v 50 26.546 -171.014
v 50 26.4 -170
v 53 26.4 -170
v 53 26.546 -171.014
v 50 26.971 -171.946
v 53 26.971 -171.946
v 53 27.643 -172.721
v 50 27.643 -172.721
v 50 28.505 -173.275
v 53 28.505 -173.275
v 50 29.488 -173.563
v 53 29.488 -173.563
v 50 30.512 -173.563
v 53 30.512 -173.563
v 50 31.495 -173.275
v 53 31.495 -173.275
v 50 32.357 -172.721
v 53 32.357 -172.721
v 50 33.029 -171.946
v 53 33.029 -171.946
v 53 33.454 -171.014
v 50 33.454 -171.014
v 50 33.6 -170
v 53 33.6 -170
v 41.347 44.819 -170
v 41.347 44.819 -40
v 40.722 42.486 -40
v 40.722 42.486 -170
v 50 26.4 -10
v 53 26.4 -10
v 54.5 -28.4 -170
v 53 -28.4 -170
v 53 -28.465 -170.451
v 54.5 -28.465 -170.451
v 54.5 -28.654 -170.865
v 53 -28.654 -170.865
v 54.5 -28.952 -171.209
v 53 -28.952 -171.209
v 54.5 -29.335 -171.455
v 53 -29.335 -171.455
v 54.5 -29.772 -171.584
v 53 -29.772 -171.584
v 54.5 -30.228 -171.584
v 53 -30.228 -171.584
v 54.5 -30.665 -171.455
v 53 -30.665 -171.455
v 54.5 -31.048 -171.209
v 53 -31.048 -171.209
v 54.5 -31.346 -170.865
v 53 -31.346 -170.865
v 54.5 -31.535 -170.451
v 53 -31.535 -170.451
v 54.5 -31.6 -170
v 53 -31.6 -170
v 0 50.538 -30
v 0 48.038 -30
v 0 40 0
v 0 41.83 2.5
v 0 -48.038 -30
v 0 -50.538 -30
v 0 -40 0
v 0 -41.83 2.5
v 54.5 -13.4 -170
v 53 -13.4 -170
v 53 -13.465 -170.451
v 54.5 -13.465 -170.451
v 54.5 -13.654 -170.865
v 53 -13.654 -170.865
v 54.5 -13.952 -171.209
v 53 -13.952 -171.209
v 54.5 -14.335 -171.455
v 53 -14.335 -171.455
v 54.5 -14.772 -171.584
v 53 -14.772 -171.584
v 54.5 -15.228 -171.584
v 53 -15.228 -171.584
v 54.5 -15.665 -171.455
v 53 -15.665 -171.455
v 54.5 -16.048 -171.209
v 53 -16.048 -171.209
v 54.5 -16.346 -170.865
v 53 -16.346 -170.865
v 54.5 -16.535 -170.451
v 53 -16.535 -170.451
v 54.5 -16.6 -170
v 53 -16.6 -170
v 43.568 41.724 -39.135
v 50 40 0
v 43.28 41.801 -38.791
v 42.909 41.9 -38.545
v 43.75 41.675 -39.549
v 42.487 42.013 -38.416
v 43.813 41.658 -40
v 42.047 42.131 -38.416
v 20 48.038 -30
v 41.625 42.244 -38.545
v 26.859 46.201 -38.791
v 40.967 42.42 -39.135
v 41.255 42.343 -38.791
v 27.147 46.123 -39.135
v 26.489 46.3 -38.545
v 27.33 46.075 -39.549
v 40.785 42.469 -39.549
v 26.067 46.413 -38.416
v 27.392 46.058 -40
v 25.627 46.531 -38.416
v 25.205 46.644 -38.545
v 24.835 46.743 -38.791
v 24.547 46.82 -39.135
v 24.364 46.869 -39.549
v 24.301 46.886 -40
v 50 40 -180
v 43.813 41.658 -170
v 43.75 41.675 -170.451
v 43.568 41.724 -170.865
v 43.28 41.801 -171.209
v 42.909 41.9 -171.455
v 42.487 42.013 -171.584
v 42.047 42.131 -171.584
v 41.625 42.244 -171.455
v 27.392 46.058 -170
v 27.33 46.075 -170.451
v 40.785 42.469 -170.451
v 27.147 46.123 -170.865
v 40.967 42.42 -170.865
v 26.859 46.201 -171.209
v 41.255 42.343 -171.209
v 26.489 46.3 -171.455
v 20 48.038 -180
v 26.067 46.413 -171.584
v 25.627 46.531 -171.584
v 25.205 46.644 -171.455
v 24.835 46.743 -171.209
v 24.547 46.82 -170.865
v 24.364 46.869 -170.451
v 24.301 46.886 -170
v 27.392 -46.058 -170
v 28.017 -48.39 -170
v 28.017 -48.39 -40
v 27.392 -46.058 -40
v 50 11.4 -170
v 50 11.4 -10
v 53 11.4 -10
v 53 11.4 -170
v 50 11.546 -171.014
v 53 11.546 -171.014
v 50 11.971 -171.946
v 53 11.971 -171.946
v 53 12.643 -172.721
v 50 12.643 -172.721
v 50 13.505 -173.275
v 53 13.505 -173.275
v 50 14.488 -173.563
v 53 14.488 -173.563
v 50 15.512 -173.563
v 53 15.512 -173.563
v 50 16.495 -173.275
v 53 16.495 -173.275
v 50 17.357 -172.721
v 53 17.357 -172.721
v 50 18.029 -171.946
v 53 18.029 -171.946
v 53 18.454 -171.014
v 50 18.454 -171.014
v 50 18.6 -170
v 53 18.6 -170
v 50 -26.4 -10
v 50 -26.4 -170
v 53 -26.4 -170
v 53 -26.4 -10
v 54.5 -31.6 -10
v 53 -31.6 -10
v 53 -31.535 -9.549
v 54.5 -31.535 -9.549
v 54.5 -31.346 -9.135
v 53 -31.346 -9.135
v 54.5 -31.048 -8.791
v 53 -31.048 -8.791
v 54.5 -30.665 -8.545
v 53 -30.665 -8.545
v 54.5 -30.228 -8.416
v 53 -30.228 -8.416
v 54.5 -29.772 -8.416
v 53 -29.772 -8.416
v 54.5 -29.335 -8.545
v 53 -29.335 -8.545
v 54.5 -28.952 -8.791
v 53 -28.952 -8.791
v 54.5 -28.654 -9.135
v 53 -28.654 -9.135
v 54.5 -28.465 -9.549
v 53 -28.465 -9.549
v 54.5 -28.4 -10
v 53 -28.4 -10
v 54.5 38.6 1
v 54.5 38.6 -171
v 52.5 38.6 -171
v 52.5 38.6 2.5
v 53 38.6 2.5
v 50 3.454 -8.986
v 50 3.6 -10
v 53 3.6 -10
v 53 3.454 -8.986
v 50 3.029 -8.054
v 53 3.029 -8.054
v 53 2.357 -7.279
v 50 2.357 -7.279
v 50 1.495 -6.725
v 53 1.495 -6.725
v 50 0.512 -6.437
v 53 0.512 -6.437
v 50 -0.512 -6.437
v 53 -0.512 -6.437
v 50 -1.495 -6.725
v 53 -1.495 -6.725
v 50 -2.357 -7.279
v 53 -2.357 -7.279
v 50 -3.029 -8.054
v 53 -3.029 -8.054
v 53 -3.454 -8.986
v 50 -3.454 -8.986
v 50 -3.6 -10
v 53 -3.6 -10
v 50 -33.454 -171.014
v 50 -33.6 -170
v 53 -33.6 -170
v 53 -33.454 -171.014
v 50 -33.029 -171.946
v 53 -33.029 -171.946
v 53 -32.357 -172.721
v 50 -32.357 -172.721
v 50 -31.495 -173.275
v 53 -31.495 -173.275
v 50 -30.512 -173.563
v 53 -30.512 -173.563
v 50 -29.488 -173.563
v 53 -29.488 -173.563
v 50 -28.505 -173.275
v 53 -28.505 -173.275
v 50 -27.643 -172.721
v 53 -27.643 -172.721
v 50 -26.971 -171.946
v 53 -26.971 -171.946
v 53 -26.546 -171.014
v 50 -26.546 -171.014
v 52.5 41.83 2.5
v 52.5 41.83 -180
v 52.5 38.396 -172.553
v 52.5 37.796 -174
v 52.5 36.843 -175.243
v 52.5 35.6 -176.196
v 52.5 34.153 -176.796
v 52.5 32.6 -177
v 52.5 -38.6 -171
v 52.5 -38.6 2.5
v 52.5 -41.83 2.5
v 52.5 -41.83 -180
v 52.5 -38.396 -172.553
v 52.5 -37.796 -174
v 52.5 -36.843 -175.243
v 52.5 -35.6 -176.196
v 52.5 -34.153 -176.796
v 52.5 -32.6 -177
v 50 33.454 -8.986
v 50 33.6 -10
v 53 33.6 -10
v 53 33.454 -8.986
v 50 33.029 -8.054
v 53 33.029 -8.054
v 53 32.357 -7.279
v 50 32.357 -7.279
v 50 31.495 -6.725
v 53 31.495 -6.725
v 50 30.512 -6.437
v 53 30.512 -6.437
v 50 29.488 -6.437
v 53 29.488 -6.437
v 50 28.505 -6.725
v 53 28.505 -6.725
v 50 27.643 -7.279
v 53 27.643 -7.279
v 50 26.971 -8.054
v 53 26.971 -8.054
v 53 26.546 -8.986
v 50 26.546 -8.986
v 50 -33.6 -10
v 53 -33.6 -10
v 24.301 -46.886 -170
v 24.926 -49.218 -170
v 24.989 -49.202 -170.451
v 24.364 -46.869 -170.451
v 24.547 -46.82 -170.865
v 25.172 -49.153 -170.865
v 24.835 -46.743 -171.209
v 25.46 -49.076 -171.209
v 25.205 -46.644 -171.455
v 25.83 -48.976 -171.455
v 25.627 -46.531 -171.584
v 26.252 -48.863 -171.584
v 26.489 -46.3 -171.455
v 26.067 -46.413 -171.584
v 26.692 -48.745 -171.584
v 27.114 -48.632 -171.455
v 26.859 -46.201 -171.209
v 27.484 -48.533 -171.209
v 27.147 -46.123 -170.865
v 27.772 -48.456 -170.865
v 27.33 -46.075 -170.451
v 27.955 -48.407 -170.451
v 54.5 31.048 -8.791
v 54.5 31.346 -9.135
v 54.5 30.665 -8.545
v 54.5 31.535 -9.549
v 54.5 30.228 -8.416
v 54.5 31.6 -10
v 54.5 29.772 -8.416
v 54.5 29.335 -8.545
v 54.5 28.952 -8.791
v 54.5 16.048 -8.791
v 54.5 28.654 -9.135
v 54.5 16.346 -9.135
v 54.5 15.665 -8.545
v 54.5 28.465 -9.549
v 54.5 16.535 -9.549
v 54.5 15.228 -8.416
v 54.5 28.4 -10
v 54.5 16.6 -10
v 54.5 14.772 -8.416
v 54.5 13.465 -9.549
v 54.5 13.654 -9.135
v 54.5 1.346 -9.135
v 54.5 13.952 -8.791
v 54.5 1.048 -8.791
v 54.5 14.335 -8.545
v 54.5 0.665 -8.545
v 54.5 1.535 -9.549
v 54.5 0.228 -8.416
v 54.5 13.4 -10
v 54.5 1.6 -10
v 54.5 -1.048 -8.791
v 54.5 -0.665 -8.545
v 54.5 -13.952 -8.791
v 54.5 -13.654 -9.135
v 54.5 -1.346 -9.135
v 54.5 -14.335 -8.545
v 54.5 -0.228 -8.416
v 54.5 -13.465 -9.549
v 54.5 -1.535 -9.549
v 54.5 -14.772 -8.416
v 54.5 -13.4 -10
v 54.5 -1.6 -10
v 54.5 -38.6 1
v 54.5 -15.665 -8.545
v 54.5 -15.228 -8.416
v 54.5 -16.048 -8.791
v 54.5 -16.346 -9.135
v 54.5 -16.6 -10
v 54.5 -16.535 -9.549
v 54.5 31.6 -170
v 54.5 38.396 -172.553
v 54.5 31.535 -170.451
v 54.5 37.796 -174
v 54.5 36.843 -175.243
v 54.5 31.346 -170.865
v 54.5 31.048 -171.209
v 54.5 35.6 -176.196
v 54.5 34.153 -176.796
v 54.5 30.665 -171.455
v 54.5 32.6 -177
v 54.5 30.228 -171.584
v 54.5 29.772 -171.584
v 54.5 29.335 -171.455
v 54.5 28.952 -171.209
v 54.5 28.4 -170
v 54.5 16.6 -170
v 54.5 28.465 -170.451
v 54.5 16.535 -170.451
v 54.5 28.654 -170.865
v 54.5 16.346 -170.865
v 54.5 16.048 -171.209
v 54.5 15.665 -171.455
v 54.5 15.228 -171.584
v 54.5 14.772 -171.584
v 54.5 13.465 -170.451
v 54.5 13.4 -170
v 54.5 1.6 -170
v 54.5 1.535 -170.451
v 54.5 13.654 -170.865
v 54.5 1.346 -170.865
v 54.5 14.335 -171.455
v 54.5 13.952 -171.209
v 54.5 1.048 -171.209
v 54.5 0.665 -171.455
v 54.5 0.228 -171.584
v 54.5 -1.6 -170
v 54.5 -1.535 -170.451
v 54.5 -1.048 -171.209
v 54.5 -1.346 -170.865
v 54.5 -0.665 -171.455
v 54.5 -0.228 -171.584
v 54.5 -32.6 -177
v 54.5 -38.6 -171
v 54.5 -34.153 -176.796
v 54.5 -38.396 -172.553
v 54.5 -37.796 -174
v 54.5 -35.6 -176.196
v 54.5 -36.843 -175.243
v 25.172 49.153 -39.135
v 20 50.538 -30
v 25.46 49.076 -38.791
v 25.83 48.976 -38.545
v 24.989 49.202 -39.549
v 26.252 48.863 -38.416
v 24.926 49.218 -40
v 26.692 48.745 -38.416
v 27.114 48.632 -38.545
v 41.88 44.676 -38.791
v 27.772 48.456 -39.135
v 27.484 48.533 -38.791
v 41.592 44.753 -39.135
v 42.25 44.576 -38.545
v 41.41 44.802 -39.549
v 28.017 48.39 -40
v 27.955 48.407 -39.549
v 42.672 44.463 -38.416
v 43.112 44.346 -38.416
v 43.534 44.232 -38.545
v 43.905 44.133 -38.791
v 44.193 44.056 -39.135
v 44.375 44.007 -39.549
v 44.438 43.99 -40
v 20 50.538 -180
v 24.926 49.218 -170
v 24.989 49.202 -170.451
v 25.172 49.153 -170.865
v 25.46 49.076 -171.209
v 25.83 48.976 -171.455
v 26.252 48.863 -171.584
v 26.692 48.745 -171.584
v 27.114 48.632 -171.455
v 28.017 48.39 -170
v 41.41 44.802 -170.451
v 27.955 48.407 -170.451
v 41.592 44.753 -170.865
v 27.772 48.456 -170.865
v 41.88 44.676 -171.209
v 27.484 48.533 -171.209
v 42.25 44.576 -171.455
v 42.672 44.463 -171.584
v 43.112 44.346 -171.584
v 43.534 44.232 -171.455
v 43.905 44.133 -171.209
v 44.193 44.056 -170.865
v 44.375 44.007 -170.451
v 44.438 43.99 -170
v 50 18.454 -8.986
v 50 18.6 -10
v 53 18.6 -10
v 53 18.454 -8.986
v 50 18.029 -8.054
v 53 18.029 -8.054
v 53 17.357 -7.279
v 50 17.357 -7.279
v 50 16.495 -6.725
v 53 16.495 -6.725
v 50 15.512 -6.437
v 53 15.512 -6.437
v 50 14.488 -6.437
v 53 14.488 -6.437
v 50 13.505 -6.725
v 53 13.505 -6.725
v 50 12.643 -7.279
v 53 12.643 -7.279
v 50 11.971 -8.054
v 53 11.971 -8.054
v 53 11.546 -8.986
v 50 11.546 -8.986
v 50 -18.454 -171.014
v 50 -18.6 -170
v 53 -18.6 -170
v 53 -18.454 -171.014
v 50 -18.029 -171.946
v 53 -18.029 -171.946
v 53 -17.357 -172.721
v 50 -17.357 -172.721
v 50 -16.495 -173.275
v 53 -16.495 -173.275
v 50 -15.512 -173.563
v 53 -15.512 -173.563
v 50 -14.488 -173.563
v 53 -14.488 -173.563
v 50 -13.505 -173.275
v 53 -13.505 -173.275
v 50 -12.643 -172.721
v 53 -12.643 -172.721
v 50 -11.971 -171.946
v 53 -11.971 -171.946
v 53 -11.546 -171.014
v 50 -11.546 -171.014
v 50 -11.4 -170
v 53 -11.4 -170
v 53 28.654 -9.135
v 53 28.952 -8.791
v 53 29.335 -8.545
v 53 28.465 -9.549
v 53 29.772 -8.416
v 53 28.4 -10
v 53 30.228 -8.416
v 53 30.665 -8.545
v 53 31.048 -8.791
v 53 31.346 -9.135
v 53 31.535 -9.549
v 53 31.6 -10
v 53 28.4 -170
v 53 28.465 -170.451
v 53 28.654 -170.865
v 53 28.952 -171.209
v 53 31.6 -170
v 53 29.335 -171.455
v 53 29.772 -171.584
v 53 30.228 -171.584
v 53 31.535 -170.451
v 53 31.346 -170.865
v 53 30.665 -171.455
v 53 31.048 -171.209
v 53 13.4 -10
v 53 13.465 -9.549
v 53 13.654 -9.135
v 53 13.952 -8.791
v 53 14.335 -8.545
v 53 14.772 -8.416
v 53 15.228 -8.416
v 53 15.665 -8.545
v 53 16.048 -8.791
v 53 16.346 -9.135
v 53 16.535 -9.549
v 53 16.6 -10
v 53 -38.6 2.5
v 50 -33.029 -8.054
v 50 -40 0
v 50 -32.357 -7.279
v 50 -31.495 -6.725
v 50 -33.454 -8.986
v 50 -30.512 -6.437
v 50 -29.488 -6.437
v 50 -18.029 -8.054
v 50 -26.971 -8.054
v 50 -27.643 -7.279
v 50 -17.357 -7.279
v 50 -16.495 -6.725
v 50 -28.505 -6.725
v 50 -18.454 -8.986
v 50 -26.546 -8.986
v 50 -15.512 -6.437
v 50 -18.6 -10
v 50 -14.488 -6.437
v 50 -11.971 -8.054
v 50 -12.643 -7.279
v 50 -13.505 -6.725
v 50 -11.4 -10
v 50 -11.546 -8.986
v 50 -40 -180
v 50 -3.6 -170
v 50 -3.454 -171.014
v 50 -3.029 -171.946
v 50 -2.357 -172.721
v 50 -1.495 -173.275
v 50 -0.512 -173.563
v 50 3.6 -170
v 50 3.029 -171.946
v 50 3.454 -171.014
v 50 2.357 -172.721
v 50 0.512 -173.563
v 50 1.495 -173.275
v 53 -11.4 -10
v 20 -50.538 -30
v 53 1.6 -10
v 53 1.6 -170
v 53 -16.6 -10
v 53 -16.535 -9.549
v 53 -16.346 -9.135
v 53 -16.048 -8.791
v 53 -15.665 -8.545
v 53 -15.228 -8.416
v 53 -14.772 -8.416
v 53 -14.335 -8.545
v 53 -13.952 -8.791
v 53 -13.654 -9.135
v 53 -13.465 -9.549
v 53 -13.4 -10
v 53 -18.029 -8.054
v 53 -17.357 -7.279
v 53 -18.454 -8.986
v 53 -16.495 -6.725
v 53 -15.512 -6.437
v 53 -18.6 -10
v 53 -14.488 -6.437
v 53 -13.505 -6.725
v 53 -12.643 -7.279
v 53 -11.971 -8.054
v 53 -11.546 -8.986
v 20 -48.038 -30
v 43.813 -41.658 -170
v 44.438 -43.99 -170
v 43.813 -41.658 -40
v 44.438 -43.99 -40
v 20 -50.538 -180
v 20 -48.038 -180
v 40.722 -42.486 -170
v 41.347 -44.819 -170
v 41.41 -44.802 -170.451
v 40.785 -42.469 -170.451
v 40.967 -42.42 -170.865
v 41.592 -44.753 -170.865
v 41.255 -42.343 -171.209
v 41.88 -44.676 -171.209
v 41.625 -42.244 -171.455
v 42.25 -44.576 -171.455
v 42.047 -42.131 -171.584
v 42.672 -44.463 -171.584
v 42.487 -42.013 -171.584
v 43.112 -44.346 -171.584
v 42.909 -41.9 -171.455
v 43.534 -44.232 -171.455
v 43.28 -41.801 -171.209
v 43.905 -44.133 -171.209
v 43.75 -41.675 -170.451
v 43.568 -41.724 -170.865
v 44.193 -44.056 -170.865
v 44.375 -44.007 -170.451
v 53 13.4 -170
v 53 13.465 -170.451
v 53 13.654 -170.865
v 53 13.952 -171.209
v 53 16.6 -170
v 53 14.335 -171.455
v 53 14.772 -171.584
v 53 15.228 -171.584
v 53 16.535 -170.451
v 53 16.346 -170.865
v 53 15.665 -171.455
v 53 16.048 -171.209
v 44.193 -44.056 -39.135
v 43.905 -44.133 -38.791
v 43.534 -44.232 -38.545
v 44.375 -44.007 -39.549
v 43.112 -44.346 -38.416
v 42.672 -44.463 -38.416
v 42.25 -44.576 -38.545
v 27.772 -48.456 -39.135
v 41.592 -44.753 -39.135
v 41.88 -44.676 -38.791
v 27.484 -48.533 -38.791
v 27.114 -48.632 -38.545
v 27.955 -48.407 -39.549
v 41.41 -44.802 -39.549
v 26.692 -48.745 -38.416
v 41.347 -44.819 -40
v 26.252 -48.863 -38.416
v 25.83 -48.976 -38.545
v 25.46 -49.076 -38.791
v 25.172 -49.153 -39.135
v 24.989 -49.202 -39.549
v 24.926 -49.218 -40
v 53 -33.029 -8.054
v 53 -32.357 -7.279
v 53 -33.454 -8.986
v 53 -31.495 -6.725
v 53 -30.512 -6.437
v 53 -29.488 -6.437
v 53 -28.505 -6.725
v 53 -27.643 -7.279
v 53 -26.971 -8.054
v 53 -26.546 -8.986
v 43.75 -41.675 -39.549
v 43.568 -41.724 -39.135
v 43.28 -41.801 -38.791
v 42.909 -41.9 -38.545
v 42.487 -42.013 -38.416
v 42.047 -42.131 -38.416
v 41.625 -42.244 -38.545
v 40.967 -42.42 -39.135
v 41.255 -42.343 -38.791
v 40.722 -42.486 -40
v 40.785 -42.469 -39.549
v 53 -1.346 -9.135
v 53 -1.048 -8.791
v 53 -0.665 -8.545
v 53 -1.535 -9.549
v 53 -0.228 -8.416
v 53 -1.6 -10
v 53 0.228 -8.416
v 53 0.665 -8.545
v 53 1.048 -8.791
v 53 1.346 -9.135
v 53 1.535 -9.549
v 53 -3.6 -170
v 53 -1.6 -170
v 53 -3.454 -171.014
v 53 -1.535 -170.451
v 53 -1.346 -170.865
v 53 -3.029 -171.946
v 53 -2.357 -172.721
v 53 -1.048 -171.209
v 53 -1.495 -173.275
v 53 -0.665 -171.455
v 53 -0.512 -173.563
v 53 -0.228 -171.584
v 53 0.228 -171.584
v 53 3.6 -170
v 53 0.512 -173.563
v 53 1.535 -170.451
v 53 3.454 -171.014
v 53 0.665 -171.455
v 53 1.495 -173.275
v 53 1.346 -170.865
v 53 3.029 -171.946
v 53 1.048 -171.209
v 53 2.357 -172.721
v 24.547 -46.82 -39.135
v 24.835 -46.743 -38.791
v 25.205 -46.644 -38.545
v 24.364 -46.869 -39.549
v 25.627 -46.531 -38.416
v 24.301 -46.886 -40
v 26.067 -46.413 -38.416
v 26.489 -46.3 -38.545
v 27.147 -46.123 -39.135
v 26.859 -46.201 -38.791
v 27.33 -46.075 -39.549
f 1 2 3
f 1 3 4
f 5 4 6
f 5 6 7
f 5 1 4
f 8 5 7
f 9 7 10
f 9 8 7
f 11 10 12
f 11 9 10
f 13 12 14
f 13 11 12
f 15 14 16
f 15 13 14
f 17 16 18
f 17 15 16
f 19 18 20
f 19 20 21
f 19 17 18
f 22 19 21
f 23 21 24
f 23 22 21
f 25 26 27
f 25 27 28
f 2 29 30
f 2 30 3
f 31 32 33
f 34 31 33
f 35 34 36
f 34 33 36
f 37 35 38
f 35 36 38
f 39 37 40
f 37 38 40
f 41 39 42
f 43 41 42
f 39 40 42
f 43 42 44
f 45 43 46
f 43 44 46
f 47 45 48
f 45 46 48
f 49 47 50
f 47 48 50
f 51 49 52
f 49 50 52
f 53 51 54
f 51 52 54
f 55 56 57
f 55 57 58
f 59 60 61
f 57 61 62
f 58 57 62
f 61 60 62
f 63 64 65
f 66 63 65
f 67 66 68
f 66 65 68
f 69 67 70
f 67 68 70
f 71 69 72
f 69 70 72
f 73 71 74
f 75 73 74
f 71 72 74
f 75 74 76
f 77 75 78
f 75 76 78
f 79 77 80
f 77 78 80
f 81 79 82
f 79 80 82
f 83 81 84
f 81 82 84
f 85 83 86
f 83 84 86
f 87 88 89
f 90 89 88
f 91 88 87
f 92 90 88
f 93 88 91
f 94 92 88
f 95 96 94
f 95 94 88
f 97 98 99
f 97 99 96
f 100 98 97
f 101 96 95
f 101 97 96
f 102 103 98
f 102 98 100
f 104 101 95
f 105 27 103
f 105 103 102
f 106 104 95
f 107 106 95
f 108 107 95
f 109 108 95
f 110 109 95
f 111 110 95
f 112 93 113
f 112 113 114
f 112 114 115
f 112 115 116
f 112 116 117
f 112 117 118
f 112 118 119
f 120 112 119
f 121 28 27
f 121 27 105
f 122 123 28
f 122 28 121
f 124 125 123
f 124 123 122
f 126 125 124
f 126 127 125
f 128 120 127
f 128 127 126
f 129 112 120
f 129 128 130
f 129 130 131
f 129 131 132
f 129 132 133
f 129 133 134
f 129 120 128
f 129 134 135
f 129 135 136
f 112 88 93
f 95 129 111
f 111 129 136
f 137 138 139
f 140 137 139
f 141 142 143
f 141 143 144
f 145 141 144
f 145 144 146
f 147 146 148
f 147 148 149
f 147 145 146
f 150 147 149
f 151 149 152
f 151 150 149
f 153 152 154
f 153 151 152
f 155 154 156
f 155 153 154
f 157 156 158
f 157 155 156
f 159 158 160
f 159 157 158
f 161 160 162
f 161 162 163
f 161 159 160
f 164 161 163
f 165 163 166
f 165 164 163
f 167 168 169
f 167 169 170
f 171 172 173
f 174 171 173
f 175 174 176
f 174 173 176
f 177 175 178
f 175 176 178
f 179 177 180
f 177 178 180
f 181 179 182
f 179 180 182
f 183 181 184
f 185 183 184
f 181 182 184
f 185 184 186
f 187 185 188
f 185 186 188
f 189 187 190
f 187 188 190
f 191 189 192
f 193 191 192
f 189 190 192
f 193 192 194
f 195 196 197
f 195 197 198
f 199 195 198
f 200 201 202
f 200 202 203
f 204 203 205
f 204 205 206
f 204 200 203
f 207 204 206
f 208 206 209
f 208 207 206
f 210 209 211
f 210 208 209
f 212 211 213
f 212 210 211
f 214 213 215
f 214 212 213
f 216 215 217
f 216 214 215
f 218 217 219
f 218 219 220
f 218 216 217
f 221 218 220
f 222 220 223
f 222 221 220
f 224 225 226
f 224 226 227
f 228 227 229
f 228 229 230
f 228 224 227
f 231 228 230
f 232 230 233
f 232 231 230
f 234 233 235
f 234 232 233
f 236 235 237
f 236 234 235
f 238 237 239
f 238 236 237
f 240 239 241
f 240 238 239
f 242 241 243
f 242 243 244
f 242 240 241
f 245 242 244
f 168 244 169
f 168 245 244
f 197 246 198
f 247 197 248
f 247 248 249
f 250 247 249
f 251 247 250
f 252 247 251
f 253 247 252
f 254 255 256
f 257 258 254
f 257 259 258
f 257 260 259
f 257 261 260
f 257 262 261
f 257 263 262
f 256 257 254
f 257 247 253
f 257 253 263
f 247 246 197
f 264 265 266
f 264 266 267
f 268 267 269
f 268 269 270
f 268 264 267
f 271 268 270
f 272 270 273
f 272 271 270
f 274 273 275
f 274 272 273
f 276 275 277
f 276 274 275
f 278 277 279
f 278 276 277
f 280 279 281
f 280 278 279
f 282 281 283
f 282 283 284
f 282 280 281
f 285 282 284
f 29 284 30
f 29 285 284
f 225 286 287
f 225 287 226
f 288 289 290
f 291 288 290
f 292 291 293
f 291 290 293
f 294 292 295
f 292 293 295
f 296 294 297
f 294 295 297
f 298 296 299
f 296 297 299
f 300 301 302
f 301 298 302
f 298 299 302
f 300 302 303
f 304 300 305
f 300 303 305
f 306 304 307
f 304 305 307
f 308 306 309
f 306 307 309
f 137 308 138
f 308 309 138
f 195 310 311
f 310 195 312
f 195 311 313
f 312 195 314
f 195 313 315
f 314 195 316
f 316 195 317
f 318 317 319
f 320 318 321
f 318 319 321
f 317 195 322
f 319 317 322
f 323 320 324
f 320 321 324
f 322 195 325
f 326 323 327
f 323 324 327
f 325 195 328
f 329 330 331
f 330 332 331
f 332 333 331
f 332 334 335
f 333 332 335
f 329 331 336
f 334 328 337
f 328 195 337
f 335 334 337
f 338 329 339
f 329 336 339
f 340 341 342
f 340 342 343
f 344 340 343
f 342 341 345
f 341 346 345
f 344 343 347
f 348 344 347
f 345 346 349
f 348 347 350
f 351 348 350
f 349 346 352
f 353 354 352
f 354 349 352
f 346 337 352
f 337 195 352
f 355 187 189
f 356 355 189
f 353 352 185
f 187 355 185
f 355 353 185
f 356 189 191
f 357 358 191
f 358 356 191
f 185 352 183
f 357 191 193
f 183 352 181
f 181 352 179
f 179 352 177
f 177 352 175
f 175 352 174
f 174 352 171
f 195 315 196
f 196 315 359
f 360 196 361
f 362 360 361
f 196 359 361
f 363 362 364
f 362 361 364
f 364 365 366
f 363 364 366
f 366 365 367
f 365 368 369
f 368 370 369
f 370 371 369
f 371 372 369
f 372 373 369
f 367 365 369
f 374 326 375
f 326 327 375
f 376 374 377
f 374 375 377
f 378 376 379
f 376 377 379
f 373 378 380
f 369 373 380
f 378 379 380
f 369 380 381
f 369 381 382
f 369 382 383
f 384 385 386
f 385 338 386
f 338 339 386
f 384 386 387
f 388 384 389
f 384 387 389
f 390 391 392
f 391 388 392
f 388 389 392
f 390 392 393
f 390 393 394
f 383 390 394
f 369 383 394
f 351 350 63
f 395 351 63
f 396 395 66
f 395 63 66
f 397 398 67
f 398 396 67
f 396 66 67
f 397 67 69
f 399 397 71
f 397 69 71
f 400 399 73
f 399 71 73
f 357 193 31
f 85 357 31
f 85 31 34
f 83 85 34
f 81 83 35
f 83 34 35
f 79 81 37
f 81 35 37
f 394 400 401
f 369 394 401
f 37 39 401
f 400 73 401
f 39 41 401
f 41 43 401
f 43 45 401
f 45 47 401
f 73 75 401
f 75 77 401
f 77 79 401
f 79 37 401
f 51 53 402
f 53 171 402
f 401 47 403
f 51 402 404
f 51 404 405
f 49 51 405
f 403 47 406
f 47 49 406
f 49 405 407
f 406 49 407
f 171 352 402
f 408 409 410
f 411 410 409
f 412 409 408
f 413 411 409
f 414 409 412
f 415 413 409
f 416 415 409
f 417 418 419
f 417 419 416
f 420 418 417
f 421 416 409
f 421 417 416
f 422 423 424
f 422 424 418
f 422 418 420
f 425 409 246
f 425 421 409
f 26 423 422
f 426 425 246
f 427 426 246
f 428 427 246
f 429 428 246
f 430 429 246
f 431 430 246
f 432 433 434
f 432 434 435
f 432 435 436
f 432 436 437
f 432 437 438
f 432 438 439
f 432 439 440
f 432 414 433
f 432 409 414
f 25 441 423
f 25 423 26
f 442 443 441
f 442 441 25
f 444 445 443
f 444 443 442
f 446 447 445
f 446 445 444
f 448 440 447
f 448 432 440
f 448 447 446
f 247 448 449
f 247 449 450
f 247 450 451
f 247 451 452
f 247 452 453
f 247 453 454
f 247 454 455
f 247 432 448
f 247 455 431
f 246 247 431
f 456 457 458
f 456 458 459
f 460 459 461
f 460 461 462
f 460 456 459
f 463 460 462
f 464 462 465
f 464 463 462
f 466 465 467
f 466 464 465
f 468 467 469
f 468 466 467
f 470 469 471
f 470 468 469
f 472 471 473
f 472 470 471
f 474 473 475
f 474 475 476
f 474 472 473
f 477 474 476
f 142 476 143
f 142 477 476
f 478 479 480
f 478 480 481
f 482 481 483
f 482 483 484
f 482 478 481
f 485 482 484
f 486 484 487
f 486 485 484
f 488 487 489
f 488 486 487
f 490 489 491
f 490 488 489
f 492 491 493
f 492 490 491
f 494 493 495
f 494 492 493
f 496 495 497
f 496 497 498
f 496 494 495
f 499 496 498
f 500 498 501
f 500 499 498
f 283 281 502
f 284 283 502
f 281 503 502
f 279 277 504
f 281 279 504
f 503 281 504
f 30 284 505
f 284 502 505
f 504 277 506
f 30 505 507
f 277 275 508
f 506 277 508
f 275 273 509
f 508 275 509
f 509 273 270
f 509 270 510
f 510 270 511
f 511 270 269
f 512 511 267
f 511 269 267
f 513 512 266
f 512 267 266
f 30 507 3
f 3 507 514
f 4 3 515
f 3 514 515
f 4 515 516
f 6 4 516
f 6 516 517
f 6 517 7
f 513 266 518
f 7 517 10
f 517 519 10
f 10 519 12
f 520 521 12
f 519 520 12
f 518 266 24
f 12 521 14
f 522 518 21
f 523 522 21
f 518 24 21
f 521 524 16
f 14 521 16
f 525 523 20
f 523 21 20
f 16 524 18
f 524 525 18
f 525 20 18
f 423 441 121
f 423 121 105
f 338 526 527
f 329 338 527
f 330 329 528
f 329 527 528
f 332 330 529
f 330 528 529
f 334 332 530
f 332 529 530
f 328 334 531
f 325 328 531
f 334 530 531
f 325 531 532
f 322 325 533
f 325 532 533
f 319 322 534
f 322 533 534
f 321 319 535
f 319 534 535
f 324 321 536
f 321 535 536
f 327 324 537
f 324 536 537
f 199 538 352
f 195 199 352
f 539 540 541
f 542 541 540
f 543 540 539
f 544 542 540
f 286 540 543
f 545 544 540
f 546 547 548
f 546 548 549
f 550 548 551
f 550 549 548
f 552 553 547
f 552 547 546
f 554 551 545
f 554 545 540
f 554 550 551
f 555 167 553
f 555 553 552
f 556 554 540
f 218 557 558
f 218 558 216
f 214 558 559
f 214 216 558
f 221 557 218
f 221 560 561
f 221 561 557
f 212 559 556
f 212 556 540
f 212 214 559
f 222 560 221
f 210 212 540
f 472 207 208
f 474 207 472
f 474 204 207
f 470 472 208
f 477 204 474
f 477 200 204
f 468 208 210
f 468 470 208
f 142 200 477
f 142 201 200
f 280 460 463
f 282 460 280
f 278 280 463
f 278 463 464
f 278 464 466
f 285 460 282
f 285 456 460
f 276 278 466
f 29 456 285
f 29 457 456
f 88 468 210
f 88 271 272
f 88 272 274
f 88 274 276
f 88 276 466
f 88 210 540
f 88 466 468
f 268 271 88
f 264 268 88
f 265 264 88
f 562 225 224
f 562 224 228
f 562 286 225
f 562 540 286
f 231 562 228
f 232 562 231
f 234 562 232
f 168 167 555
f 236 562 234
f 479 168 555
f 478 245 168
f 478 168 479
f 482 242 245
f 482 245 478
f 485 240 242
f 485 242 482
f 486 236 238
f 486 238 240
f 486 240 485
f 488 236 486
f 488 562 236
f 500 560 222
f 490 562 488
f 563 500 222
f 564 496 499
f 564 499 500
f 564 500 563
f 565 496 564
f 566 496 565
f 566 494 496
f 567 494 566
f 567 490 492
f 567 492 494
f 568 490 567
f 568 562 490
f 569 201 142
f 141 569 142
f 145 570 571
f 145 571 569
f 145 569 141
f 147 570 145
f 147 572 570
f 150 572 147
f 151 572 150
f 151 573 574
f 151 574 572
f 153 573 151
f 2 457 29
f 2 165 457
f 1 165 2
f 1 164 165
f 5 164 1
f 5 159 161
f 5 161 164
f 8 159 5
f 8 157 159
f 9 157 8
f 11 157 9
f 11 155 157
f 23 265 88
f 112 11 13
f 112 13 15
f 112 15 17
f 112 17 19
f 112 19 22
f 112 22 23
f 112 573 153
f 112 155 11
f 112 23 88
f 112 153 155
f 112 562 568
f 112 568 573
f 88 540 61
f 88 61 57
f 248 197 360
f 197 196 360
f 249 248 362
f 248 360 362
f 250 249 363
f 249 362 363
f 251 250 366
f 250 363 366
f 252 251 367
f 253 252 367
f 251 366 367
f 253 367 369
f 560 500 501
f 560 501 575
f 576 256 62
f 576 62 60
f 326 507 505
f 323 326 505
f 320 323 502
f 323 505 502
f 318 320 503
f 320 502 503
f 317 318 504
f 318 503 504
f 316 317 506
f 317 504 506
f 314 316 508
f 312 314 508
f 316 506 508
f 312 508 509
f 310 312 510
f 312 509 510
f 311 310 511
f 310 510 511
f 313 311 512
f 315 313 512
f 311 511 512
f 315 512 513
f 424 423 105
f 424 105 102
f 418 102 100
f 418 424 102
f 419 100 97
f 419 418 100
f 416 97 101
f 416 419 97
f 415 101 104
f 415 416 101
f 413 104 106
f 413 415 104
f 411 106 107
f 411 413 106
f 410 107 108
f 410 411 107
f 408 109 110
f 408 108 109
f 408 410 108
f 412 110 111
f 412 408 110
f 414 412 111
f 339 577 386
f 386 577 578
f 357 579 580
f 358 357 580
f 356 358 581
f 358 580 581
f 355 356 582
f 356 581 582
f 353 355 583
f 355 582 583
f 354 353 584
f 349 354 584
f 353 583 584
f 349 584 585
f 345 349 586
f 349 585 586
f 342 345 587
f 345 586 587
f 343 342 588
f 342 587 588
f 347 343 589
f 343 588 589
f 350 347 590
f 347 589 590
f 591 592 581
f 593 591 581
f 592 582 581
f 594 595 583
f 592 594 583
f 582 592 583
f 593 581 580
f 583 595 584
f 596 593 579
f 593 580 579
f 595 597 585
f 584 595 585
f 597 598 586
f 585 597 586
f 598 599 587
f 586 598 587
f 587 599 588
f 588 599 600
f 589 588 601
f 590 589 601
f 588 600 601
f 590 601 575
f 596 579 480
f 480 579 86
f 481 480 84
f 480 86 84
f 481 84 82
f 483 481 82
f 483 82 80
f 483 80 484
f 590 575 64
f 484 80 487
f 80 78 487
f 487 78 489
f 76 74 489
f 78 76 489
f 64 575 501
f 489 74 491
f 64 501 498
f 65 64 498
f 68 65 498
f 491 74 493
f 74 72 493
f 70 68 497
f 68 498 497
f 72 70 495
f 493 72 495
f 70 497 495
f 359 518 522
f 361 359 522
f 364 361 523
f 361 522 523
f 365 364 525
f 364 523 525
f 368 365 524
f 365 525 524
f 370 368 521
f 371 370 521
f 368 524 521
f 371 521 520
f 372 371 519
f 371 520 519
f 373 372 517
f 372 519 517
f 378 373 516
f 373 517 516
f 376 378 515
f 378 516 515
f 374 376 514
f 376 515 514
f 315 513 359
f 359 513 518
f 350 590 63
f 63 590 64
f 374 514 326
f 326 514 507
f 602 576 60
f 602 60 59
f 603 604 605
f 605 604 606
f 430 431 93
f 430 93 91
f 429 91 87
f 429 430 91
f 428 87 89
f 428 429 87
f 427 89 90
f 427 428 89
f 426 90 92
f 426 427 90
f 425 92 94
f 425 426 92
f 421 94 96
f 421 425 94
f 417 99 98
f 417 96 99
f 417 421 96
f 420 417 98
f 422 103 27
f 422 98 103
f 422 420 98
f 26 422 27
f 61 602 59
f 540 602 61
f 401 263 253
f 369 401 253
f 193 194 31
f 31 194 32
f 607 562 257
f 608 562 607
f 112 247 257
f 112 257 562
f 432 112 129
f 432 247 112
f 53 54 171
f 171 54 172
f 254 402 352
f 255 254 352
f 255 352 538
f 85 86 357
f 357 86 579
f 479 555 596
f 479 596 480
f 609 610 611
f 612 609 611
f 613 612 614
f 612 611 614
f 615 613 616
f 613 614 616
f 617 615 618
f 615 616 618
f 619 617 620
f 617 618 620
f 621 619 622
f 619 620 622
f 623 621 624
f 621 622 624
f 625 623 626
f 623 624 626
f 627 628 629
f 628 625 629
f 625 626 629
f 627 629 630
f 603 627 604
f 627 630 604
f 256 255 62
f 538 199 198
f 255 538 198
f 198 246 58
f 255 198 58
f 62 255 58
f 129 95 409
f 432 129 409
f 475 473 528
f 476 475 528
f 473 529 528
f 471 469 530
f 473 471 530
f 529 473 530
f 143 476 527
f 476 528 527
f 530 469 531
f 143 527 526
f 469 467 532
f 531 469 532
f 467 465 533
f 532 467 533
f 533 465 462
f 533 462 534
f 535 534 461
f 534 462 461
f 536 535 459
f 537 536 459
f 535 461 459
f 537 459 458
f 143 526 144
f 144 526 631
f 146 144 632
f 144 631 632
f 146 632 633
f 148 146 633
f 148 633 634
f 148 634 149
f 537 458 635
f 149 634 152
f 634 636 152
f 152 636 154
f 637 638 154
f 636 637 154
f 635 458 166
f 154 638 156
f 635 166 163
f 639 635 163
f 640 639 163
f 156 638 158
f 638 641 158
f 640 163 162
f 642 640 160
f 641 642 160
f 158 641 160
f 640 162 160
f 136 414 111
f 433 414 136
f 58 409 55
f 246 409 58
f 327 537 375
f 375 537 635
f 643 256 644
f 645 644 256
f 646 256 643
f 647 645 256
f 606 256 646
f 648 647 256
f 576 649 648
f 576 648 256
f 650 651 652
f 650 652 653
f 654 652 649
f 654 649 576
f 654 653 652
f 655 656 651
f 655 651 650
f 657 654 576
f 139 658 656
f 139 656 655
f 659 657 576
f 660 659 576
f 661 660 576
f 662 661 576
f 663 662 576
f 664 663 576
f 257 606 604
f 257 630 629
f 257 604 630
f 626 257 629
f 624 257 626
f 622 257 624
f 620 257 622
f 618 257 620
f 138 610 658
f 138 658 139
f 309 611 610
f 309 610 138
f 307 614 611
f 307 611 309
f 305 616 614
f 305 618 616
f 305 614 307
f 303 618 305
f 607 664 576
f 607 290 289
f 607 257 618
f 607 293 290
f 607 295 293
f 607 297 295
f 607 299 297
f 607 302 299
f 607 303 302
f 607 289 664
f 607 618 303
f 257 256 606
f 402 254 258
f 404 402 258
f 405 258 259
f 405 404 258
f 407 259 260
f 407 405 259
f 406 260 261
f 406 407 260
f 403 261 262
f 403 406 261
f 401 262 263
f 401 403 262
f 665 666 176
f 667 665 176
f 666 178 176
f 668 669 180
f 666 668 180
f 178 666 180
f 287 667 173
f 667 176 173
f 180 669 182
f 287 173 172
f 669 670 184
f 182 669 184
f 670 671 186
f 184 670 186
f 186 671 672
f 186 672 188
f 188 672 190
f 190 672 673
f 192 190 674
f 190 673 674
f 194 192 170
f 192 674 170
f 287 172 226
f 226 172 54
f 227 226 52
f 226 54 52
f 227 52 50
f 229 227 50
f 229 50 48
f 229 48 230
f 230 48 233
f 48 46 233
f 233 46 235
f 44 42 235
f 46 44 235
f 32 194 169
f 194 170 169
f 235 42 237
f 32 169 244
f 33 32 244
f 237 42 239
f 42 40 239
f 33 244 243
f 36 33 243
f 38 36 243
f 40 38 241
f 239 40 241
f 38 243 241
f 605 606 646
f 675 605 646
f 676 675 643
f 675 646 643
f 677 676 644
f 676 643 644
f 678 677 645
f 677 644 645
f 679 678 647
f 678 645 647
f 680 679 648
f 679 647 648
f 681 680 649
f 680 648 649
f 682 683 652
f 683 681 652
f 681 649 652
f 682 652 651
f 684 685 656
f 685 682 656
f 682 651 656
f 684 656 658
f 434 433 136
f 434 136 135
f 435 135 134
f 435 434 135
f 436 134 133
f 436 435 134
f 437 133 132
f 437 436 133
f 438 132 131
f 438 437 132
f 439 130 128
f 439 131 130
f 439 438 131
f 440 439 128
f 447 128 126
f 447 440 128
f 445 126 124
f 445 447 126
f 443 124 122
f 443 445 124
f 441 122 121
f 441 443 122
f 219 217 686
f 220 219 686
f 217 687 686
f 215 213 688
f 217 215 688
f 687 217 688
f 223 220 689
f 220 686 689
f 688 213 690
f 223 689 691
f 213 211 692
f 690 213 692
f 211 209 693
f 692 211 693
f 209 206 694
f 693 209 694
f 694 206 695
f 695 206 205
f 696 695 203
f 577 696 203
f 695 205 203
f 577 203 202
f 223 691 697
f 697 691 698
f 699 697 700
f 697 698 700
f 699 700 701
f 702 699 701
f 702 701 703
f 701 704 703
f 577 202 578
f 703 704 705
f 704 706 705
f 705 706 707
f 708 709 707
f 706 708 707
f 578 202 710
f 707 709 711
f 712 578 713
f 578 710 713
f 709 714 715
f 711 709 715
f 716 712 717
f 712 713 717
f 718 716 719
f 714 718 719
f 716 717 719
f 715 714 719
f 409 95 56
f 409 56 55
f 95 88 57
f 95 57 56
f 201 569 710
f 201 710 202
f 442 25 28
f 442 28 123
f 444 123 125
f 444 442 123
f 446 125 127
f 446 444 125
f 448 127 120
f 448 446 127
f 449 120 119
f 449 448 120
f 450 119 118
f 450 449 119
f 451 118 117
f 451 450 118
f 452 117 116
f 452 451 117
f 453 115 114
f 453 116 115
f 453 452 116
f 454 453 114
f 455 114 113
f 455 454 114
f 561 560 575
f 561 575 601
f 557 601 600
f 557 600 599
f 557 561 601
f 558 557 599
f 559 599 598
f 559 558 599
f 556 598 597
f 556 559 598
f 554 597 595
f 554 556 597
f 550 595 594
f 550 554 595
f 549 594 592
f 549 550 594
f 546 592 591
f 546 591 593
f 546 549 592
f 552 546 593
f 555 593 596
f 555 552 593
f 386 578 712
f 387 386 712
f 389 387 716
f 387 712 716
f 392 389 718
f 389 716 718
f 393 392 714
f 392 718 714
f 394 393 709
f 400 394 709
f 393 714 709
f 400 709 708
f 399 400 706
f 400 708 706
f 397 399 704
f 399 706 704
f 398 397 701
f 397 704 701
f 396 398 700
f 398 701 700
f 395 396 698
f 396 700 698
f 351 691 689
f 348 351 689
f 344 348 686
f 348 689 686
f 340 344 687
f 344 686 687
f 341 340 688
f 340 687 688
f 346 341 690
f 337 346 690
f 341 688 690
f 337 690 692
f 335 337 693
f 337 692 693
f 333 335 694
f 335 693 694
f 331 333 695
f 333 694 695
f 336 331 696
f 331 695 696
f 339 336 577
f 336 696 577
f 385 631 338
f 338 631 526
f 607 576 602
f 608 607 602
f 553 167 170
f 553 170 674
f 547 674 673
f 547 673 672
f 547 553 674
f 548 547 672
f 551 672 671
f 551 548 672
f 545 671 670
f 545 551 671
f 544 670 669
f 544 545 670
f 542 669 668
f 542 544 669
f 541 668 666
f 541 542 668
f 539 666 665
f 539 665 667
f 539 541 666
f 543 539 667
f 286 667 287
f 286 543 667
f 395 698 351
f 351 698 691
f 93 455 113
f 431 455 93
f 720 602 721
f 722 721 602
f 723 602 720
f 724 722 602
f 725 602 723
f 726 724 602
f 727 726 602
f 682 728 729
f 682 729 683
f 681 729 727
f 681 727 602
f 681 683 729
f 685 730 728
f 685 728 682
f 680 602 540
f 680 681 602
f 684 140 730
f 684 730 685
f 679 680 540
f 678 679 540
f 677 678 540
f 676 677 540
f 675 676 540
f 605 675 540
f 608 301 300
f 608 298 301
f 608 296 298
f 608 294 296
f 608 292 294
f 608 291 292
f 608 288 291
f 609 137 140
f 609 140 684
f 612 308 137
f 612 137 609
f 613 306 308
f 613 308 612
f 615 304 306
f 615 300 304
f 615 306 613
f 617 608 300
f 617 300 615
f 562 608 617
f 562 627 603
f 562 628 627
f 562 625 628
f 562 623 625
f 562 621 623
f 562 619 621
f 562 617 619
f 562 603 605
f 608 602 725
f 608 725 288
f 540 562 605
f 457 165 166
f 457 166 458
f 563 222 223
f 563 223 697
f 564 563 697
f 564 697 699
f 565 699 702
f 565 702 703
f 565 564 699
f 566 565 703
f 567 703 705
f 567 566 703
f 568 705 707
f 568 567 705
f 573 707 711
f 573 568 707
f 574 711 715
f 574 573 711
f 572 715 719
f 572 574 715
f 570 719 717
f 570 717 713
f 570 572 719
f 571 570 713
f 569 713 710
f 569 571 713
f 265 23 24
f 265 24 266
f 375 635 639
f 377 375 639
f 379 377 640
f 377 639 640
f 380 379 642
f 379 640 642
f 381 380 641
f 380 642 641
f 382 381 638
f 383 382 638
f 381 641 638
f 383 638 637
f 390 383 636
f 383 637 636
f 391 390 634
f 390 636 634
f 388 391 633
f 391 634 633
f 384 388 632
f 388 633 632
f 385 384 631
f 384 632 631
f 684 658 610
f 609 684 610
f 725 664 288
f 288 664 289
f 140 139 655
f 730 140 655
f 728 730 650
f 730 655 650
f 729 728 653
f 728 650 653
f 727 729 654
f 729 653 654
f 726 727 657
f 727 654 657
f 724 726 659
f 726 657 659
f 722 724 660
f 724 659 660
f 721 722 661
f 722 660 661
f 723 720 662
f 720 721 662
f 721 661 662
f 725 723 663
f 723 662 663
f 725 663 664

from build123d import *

# Parameters (mm, degrees)
CUT_EXTRUDE1_DEPTH  = 194.530714703
SKETCH7_W           = 174
SKETCH7_H           = 77.2
BOSS_EXTRUDE1_DEPTH = 2
CUT_EXTRUDE2_DEPTH  = 3
FILLET1_R           = 6
CHAMFER1_SIZE       = 6
CUT_EXTRUDE3_REACH  = 213.158


with BuildPart() as part:
    # Sweep1: sweep along a path in Sketch2
    with BuildLine(Plane(origin=(0, 0, 0), x_dir=(1, 0, 0), z_dir=(0, 1, 0))) as sweep1_path:
        Line((0, 0), (50, 0))
        Line((50, 0), (50, 180))
    # Sketch4 → Sweep1 (sweep)
    with BuildSketch(Plane(origin=(0, 0, 0), x_dir=(0, 0, -1), z_dir=(1, 0, 0))):
        Polygon((0, -40), (0, 40), (30, 48.038475773), (30, 50.538475773), (-2.5, 41.830127019), (-2.5, -41.830127019), (30, -50.538475773), (30, -48.038475773), align=None)
    sweep(path=sweep1_path.line, transition=Transition.RIGHT)

    # Sketch6 → Cut-Extrude1 (cut, through all)
    with BuildSketch(Plane.ZY.offset(-50)):
        with BuildLine():
            Line((-10, 28.4), (-170, 28.4))
            ThreePointArc((-170, 28.4), (-171.6, 30), (-170, 31.6))
            Line((-170, 31.6), (-10, 31.6))
            ThreePointArc((-10, 31.6), (-8.4, 30), (-10, 28.4))
        make_face()
        with BuildLine():
            Line((-10, -1.6), (-170, -1.6))
            ThreePointArc((-170, -1.6), (-171.6, 0), (-170, 1.6))
            Line((-170, 1.6), (-10, 1.6))
            ThreePointArc((-10, 1.6), (-8.4, 0), (-10, -1.6))
        make_face()
        with BuildLine():
            Line((-10, -31.6), (-170, -31.6))
            ThreePointArc((-170, -31.6), (-171.6, -30), (-170, -28.4))
            Line((-170, -28.4), (-10, -28.4))
            ThreePointArc((-10, -28.4), (-8.4, -30), (-10, -31.6))
        make_face()
        with BuildLine():
            Line((-10, -16.6), (-170, -16.6))
            ThreePointArc((-170, -16.6), (-171.6, -15), (-170, -13.4))
            Line((-170, -13.4), (-10, -13.4))
            ThreePointArc((-10, -13.4), (-8.4, -15), (-10, -16.6))
        make_face()
        with BuildLine():
            Line((-10, 13.4), (-170, 13.4))
            ThreePointArc((-170, 13.4), (-171.6, 15), (-170, 16.6))
            Line((-170, 16.6), (-10, 16.6))
            ThreePointArc((-10, 16.6), (-8.4, 15), (-10, 13.4))
        make_face()
    extrude(amount=-CUT_EXTRUDE1_DEPTH, mode=Mode.SUBTRACT)

    # Sketch7 → Boss-Extrude1 (add)
    with BuildSketch(Plane(origin=(52.5, 0, 0), x_dir=(0, 0, -1), z_dir=(1, 0, 0))):
        with Locations((90, 0)):
            Rectangle(SKETCH7_W, SKETCH7_H)
        with BuildLine():
            Line((170, -31.6), (10, -31.6))
            ThreePointArc((10, -31.6), (8.4, -30), (10, -28.4))
            Line((10, -28.4), (170, -28.4))
            ThreePointArc((170, -28.4), (171.6, -30), (170, -31.6))
        make_face(mode=Mode.SUBTRACT)
        with BuildLine():
            Line((170, -16.6), (10, -16.6))
            ThreePointArc((10, -16.6), (8.4, -15), (10, -13.4))
            Line((10, -13.4), (170, -13.4))
            ThreePointArc((170, -13.4), (171.6, -15), (170, -16.6))
        make_face(mode=Mode.SUBTRACT)
        with BuildLine():
            Line((10, 1.6), (170, 1.6))
            ThreePointArc((170, 1.6), (171.6, 0), (170, -1.6))
            Line((170, -1.6), (10, -1.6))
            ThreePointArc((10, -1.6), (8.4, 0), (10, 1.6))
        make_face(mode=Mode.SUBTRACT)
        with BuildLine():
            Line((170, 13.4), (10, 13.4))
            ThreePointArc((10, 13.4), (8.4, 15), (10, 16.6))
            Line((10, 16.6), (170, 16.6))
            ThreePointArc((170, 16.6), (171.6, 15), (170, 13.4))
        make_face(mode=Mode.SUBTRACT)
        with BuildLine():
            Line((170, 28.4), (10, 28.4))
            ThreePointArc((10, 28.4), (8.4, 30), (10, 31.6))
            Line((10, 31.6), (170, 31.6))
            ThreePointArc((170, 31.6), (171.6, 30), (170, 28.4))
        make_face(mode=Mode.SUBTRACT)
    extrude(amount=BOSS_EXTRUDE1_DEPTH)

    # Sketch9 → Cut-Extrude2 (cut)
    with BuildSketch(Plane.ZY.offset(-50)):
        with BuildLine():
            Line((-170, 33.6), (-10, 33.6))
            ThreePointArc((-10, 33.6), (-6.4, 30), (-10, 26.4))
            Line((-10, 26.4), (-170, 26.4))
            ThreePointArc((-170, 26.4), (-173.6, 30), (-170, 33.6))
        make_face()
        with BuildLine():
            Line((-170, 18.6), (-10, 18.6))
            ThreePointArc((-10, 18.6), (-6.4, 15), (-10, 11.4))
            Line((-10, 11.4), (-170, 11.4))
            ThreePointArc((-170, 11.4), (-173.6, 15), (-170, 18.6))
        make_face()
        with BuildLine():
            Line((-170, 3.6), (-10, 3.6))
            ThreePointArc((-10, 3.6), (-6.4, 0), (-10, -3.6))
            Line((-10, -3.6), (-170, -3.6))
            ThreePointArc((-170, -3.6), (-173.6, 0), (-170, 3.6))
        make_face()
        with BuildLine():
            Line((-170, -11.4), (-10, -11.4))
            ThreePointArc((-10, -11.4), (-6.4, -15), (-10, -18.6))
            Line((-10, -18.6), (-170, -18.6))
            ThreePointArc((-170, -18.6), (-173.6, -15), (-170, -11.4))
        make_face()
        with BuildLine():
            Line((-170, -26.4), (-10, -26.4))
            ThreePointArc((-10, -26.4), (-6.4, -30), (-10, -33.6))
            Line((-10, -33.6), (-170, -33.6))
            ThreePointArc((-170, -33.6), (-173.6, -30), (-170, -26.4))
        make_face()
    extrude(amount=-CUT_EXTRUDE2_DEPTH, mode=Mode.SUBTRACT)

    # Fillet1
    fillet1_edges = [part.edges().sort_by_distance(p)[0] for p in [
        (53.5, -38.6, -177),
        (53.5, 38.6, -177),
    ]]
    fillet(fillet1_edges, radius=FILLET1_R)

    # Chamfer1
    # the kernel refuses this chamfer: 6 mm, written as the material it adds along each edge
    with BuildSketch(Plane(origin=(52.5, -38.6, -3), x_dir=(-0.02749587661058908, 0, 0.9996219169112968), z_dir=(0, 1, 0))) as chamfer1_piece_1_section:
        Polygon((CHAMFER1_SIZE * 0.999621916911, CHAMFER1_SIZE * 0.0274958766106), (-CHAMFER1_SIZE * 0.0274958766106, CHAMFER1_SIZE * 0.999621916911), (0, 0), align=None)
    chamfer1_piece_1 = extrude(amount=77.2, mode=Mode.PRIVATE)
    chamfer1_piece_1 = split(chamfer1_piece_1, bisect_by=Plane(origin=(53.373608637, 0, 2.5), z_dir=(0, 0, -1)), keep=Keep.TOP, mode=Mode.PRIVATE)
    chamfer1_piece_1 = split(chamfer1_piece_1, bisect_by=Plane(origin=(54.5, 0, -0.51208469), z_dir=(-1, 0, 0)), keep=Keep.TOP, mode=Mode.PRIVATE)
    add(chamfer1_piece_1)

    # Sketch10 → Cut-Extrude3 (cut, up to next)
    with BuildSketch(Plane(origin=(13.974364905, 52.15303983, 0), x_dir=(0.9659258262890679, -0.25881904510252257, 0), z_dir=(0.2588190451025226, 0.9659258262890679, 0)), mode=Mode.PRIVATE) as cut_extrude3_sk1:
        with BuildLine():
            Line((14.538196485, 170), (14.538196485, 40))
            ThreePointArc((14.538196485, 40), (12.938196485, 38.4), (11.338196485, 40))
            Line((11.338196485, 40), (11.338196485, 170))
            ThreePointArc((11.338196485, 170), (12.938196485, 171.6), (14.538196485, 170))
        make_face()
    cut_extrude3_tool1 = extrude(cut_extrude3_sk1.sketch, amount=-CUT_EXTRUDE3_REACH, mode=Mode.PRIVATE) & part.part
    # Sketch10 → Cut-Extrude3 (cut, up to next)
    with BuildSketch(Plane(origin=(13.974364905, 52.15303983, 0), x_dir=(0.9659258262890679, -0.25881904510252257, 0), z_dir=(0.2588190451025226, 0.9659258262890679, 0)), mode=Mode.PRIVATE) as cut_extrude3_sk2:
        with BuildLine():
            Line((31.538196485, 170), (31.538196485, 40))
            ThreePointArc((31.538196485, 40), (29.938196485, 38.4), (28.338196485, 40))
            Line((28.338196485, 40), (28.338196485, 170))
            ThreePointArc((28.338196485, 170), (29.938196485, 171.6), (31.538196485, 170))
        make_face()
    cut_extrude3_tool2 = extrude(cut_extrude3_sk2.sketch, amount=-CUT_EXTRUDE3_REACH, mode=Mode.PRIVATE) & part.part
    cut_extrude3_1 = cut_extrude3_tool1.solids().sort_by_distance((26.471703, 48.804388, -105))[0]
    add(cut_extrude3_1, mode=Mode.SUBTRACT)
    cut_extrude3_2 = cut_extrude3_tool2.solids().sort_by_distance((42.892442, 44.404464, -105))[0]
    add(cut_extrude3_2, mode=Mode.SUBTRACT)
    cut_extrude3 = cut_extrude3_1 + cut_extrude3_2  # Cut-Extrude3 as one shape, for the pattern or mirror that repeats it

    # Mirror1: Cut-Extrude3 across plane
    add(cut_extrude3.mirror(Plane.ZX), mode=Mode.SUBTRACT)


solid = part.part
